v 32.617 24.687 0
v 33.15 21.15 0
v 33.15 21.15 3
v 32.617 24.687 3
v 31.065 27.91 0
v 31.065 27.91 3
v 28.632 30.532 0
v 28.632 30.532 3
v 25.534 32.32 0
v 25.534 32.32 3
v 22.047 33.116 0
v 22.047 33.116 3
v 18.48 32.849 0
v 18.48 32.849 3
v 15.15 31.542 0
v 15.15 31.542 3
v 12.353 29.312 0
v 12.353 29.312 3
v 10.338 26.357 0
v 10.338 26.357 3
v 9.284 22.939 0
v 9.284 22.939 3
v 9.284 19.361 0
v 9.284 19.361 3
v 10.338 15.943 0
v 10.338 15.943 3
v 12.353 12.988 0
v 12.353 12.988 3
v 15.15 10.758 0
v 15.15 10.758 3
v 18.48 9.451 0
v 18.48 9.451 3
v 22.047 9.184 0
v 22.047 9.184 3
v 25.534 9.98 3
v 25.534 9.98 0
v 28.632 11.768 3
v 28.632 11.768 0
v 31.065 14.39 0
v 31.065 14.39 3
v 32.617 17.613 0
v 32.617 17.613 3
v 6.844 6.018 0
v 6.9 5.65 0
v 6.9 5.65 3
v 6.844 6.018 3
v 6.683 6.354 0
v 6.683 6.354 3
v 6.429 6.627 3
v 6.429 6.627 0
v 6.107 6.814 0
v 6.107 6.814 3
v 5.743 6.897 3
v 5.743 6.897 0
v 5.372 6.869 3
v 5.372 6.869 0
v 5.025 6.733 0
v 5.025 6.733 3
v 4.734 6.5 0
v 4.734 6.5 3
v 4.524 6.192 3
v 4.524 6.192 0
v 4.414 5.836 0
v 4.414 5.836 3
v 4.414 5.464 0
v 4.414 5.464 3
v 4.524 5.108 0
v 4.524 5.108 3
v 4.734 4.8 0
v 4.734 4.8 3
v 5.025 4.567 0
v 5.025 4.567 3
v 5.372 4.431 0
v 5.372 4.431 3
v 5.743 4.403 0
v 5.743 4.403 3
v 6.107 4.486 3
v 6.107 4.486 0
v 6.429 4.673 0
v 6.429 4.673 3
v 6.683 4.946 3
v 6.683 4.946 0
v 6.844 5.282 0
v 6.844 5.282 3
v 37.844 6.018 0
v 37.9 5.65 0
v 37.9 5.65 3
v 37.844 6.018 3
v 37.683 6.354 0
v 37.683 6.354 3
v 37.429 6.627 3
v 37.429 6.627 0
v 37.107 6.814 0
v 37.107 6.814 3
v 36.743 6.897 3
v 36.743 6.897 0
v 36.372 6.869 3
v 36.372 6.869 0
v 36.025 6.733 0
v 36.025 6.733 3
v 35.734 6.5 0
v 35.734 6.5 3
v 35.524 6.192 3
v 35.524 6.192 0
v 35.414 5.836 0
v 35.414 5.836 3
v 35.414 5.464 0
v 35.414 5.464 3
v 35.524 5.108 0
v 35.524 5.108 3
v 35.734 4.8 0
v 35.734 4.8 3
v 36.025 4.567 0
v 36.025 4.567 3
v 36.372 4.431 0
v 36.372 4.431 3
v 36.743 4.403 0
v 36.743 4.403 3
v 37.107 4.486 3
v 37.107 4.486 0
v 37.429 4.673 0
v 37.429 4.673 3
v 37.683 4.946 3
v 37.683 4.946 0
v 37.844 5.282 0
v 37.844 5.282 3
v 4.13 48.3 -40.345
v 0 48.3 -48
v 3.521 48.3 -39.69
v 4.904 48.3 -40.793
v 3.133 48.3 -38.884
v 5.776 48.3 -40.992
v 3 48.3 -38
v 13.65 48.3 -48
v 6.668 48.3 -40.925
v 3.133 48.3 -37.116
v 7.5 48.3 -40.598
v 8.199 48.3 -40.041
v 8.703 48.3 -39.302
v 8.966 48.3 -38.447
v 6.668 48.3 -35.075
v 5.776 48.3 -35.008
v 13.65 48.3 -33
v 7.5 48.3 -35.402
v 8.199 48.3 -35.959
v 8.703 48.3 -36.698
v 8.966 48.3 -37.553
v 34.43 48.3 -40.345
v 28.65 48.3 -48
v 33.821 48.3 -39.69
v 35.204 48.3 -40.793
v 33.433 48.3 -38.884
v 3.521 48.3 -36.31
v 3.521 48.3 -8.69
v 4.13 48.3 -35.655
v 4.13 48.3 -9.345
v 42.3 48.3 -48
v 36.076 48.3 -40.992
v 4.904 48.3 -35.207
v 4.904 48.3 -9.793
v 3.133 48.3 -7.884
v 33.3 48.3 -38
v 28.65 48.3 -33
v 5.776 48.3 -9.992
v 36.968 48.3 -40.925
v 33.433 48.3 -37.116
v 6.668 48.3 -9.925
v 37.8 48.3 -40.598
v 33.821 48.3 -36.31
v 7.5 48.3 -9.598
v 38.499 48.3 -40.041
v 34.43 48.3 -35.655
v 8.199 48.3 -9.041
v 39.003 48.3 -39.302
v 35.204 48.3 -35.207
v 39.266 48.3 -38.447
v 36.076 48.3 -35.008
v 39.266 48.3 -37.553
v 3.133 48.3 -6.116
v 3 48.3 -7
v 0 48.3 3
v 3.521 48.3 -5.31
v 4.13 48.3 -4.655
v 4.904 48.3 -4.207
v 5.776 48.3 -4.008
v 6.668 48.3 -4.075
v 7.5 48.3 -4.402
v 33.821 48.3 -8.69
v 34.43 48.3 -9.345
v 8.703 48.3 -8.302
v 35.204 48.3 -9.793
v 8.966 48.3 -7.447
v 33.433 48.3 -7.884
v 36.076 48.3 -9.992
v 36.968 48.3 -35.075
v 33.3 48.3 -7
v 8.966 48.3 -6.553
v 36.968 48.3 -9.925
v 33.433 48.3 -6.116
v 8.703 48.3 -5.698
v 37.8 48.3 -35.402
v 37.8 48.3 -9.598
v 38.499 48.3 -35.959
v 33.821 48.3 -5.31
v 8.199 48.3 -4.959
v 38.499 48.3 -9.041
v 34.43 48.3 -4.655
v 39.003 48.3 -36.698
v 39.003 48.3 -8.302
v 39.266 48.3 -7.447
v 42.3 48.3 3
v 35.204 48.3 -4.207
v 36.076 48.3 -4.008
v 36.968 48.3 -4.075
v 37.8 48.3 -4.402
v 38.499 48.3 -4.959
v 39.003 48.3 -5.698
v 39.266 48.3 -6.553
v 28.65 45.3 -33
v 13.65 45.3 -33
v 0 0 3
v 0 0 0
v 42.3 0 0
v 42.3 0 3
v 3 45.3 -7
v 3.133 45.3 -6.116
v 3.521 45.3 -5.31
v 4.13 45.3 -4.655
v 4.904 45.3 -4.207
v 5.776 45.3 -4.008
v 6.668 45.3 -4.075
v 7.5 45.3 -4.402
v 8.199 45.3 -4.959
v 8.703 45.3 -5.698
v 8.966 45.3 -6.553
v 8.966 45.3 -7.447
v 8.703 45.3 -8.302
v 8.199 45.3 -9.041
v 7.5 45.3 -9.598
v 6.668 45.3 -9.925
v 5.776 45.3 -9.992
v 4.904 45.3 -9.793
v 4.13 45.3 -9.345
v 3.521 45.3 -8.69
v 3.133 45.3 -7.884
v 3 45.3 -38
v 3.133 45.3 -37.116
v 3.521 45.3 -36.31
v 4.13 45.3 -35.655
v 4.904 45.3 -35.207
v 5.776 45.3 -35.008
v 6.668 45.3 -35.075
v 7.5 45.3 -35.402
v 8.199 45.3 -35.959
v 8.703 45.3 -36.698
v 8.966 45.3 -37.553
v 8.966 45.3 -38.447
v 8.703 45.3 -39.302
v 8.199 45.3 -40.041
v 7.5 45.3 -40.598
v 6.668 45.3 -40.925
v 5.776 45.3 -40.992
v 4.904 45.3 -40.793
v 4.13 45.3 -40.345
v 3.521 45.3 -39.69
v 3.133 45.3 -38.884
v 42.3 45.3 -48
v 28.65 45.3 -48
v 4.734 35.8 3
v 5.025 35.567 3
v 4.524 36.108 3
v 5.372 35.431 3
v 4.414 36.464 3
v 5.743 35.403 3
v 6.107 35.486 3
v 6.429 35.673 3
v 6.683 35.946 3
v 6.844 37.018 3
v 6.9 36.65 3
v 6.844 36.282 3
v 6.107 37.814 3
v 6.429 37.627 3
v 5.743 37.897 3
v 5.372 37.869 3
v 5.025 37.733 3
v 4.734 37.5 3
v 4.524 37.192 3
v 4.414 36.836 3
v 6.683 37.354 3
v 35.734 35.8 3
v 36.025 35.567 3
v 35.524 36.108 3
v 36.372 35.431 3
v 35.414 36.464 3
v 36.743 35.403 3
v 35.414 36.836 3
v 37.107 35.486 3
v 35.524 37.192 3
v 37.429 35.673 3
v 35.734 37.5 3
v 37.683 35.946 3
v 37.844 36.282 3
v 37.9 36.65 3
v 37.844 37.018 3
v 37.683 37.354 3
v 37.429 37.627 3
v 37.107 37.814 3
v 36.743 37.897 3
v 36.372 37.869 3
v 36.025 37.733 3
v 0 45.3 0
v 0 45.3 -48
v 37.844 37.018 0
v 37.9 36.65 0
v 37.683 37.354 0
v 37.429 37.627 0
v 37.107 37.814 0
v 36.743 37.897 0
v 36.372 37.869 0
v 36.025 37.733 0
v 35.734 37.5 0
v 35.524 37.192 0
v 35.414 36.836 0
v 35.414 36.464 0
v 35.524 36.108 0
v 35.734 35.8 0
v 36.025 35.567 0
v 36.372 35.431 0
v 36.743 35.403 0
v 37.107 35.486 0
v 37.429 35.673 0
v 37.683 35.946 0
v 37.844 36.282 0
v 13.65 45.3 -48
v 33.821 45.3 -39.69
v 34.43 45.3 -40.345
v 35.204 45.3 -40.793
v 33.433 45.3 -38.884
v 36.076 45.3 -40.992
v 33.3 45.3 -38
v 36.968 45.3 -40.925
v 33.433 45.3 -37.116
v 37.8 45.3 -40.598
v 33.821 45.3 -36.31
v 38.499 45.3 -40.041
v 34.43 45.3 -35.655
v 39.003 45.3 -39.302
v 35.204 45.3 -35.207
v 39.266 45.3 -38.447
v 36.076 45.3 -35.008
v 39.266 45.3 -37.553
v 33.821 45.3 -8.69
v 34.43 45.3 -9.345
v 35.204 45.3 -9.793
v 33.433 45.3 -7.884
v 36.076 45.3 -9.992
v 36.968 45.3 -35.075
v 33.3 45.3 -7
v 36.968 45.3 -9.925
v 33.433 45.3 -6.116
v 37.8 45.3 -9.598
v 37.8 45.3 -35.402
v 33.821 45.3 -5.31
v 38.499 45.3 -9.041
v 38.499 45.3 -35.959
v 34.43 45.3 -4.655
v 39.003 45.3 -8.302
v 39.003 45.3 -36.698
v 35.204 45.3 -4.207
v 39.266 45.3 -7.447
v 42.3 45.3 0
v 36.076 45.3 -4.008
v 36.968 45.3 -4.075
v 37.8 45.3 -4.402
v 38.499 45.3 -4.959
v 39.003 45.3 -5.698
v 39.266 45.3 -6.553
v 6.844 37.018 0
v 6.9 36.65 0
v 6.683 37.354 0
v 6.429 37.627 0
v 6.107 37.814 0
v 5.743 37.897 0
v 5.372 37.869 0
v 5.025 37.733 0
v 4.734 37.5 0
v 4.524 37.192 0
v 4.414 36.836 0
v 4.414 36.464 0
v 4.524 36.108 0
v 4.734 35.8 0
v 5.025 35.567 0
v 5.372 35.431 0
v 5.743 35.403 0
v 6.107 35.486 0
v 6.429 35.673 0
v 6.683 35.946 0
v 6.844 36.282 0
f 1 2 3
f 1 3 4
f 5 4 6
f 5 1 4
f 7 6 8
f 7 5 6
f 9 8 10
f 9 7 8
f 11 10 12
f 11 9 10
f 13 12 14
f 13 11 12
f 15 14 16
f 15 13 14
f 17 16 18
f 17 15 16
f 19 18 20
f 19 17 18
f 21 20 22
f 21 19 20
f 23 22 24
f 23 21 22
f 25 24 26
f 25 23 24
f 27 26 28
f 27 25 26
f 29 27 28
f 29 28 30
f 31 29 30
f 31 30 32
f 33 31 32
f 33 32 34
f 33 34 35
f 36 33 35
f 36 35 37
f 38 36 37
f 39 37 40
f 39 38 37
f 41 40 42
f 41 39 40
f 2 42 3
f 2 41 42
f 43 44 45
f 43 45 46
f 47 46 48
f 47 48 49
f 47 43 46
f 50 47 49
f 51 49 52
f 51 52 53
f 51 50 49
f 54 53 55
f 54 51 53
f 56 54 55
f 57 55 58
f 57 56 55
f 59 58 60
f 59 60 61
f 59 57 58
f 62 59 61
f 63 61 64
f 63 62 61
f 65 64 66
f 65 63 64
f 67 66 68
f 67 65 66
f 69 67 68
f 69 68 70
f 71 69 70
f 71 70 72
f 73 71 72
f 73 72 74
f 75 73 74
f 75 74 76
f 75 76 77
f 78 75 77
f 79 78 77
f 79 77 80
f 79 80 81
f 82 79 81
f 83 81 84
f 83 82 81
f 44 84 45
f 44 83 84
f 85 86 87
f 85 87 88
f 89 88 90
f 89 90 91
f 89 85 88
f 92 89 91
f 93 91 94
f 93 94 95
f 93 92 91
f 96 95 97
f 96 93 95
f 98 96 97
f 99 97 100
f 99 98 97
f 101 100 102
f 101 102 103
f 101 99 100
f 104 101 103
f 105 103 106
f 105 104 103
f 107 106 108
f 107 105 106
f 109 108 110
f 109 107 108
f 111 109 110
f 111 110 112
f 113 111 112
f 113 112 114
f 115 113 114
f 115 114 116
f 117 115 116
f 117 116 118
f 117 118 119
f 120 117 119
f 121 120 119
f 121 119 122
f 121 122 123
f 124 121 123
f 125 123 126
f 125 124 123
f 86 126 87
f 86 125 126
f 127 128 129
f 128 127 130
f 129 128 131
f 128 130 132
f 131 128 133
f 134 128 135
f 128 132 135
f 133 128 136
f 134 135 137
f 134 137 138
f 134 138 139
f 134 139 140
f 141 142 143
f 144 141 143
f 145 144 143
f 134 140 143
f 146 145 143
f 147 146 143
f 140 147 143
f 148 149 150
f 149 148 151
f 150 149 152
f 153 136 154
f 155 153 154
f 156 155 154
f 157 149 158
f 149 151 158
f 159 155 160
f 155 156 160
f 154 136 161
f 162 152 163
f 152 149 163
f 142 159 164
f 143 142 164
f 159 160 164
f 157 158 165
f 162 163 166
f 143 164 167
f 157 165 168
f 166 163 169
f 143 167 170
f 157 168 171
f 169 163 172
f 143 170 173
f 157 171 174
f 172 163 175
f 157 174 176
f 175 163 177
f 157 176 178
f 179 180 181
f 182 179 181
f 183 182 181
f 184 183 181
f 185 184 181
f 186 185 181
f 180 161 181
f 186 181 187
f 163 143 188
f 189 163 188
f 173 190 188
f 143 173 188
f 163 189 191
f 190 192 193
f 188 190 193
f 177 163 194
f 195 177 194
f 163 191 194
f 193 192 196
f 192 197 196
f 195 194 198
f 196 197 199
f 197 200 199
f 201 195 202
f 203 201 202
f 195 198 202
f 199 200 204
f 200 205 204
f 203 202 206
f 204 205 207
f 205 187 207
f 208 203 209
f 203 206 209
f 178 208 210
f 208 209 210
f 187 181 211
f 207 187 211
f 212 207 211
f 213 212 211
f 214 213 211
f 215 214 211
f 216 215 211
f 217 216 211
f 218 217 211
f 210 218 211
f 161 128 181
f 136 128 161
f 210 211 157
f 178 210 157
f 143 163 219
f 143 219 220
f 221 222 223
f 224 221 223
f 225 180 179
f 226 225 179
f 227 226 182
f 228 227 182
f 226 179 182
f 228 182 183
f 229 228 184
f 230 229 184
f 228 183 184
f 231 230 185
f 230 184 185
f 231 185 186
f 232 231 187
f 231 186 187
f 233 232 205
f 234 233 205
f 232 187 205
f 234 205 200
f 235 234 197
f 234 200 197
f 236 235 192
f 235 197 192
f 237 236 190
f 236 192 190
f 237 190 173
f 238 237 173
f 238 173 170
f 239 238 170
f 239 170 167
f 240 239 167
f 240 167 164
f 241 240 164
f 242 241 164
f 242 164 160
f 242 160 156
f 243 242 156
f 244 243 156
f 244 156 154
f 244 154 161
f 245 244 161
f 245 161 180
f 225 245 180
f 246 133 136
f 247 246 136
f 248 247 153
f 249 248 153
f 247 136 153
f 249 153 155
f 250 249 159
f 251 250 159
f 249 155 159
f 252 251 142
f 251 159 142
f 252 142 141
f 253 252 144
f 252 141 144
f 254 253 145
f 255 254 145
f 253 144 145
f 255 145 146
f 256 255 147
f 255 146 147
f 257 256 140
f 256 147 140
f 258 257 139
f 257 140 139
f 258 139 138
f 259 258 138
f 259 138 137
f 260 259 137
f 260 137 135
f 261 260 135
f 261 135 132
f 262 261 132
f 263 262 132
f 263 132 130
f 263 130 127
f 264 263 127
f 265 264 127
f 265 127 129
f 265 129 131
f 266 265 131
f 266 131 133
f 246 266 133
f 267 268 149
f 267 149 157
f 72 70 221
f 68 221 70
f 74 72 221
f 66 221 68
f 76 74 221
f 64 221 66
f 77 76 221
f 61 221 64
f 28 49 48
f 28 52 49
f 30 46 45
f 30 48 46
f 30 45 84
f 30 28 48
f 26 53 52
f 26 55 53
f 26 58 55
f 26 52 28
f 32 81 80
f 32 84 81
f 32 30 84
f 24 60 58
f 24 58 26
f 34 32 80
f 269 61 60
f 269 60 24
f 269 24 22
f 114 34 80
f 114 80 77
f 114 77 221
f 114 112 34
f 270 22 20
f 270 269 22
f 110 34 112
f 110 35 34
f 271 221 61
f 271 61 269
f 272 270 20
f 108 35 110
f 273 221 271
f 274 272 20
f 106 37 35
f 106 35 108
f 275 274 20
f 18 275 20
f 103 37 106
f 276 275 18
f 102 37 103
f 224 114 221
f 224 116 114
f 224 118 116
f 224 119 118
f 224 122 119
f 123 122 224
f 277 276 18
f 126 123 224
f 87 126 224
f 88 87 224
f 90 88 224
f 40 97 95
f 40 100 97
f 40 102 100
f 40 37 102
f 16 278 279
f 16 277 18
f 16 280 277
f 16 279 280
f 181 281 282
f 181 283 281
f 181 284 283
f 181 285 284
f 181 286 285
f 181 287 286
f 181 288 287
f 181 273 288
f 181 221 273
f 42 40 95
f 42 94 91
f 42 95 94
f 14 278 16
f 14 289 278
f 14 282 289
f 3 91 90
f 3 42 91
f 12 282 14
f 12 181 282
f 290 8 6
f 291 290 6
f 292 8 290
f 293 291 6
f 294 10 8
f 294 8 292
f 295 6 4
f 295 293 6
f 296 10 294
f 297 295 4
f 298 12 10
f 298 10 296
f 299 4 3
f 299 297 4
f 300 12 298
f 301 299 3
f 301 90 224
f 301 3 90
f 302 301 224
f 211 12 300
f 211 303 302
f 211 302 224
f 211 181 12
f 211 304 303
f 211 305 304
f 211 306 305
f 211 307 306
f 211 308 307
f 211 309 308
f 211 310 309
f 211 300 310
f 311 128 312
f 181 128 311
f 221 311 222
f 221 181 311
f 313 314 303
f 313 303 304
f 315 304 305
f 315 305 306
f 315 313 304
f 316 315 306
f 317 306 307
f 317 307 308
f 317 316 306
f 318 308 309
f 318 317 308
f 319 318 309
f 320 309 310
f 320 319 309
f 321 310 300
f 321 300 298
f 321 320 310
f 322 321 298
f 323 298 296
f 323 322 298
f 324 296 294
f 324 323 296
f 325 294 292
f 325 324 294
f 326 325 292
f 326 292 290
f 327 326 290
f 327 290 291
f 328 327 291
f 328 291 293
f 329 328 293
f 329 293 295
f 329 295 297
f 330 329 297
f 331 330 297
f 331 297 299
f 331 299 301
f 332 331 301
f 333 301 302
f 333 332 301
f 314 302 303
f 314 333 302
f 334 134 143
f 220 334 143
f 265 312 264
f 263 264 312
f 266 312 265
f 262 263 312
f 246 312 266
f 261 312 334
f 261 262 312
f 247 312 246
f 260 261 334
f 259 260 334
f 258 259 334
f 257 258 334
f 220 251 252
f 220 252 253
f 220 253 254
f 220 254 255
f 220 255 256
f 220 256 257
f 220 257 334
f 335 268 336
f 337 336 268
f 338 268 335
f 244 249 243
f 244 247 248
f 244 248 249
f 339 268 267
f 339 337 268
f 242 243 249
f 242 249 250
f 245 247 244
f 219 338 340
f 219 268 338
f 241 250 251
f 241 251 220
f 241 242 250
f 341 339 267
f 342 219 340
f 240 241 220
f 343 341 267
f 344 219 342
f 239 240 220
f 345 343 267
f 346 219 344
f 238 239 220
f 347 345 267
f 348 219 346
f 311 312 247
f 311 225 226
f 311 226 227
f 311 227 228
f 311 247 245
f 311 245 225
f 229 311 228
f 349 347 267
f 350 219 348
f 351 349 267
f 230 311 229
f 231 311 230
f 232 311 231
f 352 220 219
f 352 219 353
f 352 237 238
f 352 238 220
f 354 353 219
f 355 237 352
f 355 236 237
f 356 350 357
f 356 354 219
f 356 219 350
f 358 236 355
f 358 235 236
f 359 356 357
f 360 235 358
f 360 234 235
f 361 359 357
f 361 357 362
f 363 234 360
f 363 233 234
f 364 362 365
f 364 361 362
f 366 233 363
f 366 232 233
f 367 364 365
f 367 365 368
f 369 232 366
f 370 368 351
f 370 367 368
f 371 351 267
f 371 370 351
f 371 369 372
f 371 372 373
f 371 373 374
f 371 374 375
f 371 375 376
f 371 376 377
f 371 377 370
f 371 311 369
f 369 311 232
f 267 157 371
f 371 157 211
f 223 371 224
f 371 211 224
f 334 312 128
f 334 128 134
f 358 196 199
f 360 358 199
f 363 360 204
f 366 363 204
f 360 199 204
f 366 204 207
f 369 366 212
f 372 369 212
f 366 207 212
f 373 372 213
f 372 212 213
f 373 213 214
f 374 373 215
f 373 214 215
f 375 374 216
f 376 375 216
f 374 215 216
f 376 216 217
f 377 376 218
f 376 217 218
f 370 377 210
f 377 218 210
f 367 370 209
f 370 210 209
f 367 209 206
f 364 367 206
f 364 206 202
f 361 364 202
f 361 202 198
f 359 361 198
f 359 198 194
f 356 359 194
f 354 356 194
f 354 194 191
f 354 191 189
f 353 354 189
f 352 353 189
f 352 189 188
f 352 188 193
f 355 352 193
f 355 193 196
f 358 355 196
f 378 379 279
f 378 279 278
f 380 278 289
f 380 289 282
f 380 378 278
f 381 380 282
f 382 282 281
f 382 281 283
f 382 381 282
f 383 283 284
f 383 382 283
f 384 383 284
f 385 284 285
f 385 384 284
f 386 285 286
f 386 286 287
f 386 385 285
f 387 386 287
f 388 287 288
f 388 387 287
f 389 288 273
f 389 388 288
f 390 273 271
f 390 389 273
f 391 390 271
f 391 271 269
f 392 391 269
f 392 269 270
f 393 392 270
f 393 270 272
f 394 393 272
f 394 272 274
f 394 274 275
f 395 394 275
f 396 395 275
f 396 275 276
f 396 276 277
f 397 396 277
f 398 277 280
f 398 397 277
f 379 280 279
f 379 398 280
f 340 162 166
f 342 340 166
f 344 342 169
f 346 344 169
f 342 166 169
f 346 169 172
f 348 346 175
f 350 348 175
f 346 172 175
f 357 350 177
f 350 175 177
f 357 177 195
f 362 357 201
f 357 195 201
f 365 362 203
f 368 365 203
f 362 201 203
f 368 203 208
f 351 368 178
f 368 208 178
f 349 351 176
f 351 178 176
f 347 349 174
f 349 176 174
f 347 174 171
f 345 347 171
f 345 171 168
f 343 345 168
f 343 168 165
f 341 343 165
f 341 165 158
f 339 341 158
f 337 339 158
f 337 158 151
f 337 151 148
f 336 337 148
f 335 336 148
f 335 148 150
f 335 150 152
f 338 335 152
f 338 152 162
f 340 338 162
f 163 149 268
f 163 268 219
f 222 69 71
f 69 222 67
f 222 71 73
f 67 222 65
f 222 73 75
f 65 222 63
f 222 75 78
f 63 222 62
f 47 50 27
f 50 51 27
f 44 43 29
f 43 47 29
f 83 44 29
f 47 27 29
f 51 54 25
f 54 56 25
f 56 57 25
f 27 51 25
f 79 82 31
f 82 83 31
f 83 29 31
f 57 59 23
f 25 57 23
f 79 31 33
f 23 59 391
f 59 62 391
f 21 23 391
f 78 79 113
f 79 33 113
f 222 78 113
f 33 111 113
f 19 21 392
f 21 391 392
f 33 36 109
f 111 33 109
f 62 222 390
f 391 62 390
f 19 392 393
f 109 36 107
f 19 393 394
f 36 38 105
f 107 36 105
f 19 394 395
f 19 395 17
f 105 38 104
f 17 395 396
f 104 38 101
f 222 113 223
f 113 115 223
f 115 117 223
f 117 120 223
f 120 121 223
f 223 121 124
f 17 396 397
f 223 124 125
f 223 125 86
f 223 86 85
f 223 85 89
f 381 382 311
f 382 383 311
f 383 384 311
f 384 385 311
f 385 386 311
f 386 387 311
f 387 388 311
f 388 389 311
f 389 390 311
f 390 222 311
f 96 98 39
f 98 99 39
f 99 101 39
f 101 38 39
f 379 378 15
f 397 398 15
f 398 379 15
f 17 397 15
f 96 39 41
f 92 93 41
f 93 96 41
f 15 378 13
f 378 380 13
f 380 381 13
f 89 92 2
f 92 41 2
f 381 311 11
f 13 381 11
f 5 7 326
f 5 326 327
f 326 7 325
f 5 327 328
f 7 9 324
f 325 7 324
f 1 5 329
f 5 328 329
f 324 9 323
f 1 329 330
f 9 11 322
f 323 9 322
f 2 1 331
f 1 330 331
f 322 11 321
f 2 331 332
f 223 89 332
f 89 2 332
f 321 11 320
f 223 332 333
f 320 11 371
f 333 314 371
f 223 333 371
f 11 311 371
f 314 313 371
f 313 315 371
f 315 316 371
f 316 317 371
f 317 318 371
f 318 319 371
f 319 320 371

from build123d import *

# Parameters (mm, degrees)
SKETCH_R     = 1.25
SKETCH_R_2   = 12
PAD_DEPTH    = 3
SKETCH001_W  = 42.3
SKETCH001_H  = 3
PAD001_DEPTH = 48
SKETCH002_R  = 3
SKETCH002_W  = 15
SKETCH002_H  = 15
POCKET_DEPTH = 48.301


with BuildPart() as part:
    # Sketch → Pad (new body)
    with BuildSketch(Plane.XY):
        Polygon((0, 0), (42.3, 0), (42.3, 42.3), (42.3, 48.3), (0, 48.3), (0, 42.3), align=None)
        with Locations((5.65, 36.65)):
            Circle(SKETCH_R, mode=Mode.SUBTRACT)
        with Locations((36.65, 36.65)):
            Circle(SKETCH_R, mode=Mode.SUBTRACT)
        with Locations((5.65, 5.65)):
            Circle(SKETCH_R, mode=Mode.SUBTRACT)
        with Locations((36.65, 5.65)):
            Circle(SKETCH_R, mode=Mode.SUBTRACT)
        with Locations((21.15, 21.15)):
            Circle(SKETCH_R_2, mode=Mode.SUBTRACT)
    extrude(amount=PAD_DEPTH)

    # Sketch001 → Pad001 (new body)
    with BuildSketch(Plane(origin=(0, 0, 0), x_dir=(1, 0, 0), z_dir=(0, 0, -1))):
        with Locations((21.15, -46.8)):
            Rectangle(SKETCH001_W, SKETCH001_H)
    extrude(amount=PAD001_DEPTH)

    # Sketch002 → Pocket (cut, through all)
    with BuildSketch(Plane(origin=(0, 48.3, 0), x_dir=(-1, 0, 0), z_dir=(0, 1, 0))):
        with Locations((-36.3, -7)):
            Circle(SKETCH002_R)
        with Locations((-6, -7)):
            Circle(SKETCH002_R)
        with Locations((-36.3, -38)):
            Circle(SKETCH002_R)
        with Locations((-6, -38)):
            Circle(SKETCH002_R)
        with Locations((-21.15, -40.5)):
            Rectangle(SKETCH002_W, SKETCH002_H)
    extrude(amount=-POCKET_DEPTH, mode=Mode.SUBTRACT)


solid = part.part
